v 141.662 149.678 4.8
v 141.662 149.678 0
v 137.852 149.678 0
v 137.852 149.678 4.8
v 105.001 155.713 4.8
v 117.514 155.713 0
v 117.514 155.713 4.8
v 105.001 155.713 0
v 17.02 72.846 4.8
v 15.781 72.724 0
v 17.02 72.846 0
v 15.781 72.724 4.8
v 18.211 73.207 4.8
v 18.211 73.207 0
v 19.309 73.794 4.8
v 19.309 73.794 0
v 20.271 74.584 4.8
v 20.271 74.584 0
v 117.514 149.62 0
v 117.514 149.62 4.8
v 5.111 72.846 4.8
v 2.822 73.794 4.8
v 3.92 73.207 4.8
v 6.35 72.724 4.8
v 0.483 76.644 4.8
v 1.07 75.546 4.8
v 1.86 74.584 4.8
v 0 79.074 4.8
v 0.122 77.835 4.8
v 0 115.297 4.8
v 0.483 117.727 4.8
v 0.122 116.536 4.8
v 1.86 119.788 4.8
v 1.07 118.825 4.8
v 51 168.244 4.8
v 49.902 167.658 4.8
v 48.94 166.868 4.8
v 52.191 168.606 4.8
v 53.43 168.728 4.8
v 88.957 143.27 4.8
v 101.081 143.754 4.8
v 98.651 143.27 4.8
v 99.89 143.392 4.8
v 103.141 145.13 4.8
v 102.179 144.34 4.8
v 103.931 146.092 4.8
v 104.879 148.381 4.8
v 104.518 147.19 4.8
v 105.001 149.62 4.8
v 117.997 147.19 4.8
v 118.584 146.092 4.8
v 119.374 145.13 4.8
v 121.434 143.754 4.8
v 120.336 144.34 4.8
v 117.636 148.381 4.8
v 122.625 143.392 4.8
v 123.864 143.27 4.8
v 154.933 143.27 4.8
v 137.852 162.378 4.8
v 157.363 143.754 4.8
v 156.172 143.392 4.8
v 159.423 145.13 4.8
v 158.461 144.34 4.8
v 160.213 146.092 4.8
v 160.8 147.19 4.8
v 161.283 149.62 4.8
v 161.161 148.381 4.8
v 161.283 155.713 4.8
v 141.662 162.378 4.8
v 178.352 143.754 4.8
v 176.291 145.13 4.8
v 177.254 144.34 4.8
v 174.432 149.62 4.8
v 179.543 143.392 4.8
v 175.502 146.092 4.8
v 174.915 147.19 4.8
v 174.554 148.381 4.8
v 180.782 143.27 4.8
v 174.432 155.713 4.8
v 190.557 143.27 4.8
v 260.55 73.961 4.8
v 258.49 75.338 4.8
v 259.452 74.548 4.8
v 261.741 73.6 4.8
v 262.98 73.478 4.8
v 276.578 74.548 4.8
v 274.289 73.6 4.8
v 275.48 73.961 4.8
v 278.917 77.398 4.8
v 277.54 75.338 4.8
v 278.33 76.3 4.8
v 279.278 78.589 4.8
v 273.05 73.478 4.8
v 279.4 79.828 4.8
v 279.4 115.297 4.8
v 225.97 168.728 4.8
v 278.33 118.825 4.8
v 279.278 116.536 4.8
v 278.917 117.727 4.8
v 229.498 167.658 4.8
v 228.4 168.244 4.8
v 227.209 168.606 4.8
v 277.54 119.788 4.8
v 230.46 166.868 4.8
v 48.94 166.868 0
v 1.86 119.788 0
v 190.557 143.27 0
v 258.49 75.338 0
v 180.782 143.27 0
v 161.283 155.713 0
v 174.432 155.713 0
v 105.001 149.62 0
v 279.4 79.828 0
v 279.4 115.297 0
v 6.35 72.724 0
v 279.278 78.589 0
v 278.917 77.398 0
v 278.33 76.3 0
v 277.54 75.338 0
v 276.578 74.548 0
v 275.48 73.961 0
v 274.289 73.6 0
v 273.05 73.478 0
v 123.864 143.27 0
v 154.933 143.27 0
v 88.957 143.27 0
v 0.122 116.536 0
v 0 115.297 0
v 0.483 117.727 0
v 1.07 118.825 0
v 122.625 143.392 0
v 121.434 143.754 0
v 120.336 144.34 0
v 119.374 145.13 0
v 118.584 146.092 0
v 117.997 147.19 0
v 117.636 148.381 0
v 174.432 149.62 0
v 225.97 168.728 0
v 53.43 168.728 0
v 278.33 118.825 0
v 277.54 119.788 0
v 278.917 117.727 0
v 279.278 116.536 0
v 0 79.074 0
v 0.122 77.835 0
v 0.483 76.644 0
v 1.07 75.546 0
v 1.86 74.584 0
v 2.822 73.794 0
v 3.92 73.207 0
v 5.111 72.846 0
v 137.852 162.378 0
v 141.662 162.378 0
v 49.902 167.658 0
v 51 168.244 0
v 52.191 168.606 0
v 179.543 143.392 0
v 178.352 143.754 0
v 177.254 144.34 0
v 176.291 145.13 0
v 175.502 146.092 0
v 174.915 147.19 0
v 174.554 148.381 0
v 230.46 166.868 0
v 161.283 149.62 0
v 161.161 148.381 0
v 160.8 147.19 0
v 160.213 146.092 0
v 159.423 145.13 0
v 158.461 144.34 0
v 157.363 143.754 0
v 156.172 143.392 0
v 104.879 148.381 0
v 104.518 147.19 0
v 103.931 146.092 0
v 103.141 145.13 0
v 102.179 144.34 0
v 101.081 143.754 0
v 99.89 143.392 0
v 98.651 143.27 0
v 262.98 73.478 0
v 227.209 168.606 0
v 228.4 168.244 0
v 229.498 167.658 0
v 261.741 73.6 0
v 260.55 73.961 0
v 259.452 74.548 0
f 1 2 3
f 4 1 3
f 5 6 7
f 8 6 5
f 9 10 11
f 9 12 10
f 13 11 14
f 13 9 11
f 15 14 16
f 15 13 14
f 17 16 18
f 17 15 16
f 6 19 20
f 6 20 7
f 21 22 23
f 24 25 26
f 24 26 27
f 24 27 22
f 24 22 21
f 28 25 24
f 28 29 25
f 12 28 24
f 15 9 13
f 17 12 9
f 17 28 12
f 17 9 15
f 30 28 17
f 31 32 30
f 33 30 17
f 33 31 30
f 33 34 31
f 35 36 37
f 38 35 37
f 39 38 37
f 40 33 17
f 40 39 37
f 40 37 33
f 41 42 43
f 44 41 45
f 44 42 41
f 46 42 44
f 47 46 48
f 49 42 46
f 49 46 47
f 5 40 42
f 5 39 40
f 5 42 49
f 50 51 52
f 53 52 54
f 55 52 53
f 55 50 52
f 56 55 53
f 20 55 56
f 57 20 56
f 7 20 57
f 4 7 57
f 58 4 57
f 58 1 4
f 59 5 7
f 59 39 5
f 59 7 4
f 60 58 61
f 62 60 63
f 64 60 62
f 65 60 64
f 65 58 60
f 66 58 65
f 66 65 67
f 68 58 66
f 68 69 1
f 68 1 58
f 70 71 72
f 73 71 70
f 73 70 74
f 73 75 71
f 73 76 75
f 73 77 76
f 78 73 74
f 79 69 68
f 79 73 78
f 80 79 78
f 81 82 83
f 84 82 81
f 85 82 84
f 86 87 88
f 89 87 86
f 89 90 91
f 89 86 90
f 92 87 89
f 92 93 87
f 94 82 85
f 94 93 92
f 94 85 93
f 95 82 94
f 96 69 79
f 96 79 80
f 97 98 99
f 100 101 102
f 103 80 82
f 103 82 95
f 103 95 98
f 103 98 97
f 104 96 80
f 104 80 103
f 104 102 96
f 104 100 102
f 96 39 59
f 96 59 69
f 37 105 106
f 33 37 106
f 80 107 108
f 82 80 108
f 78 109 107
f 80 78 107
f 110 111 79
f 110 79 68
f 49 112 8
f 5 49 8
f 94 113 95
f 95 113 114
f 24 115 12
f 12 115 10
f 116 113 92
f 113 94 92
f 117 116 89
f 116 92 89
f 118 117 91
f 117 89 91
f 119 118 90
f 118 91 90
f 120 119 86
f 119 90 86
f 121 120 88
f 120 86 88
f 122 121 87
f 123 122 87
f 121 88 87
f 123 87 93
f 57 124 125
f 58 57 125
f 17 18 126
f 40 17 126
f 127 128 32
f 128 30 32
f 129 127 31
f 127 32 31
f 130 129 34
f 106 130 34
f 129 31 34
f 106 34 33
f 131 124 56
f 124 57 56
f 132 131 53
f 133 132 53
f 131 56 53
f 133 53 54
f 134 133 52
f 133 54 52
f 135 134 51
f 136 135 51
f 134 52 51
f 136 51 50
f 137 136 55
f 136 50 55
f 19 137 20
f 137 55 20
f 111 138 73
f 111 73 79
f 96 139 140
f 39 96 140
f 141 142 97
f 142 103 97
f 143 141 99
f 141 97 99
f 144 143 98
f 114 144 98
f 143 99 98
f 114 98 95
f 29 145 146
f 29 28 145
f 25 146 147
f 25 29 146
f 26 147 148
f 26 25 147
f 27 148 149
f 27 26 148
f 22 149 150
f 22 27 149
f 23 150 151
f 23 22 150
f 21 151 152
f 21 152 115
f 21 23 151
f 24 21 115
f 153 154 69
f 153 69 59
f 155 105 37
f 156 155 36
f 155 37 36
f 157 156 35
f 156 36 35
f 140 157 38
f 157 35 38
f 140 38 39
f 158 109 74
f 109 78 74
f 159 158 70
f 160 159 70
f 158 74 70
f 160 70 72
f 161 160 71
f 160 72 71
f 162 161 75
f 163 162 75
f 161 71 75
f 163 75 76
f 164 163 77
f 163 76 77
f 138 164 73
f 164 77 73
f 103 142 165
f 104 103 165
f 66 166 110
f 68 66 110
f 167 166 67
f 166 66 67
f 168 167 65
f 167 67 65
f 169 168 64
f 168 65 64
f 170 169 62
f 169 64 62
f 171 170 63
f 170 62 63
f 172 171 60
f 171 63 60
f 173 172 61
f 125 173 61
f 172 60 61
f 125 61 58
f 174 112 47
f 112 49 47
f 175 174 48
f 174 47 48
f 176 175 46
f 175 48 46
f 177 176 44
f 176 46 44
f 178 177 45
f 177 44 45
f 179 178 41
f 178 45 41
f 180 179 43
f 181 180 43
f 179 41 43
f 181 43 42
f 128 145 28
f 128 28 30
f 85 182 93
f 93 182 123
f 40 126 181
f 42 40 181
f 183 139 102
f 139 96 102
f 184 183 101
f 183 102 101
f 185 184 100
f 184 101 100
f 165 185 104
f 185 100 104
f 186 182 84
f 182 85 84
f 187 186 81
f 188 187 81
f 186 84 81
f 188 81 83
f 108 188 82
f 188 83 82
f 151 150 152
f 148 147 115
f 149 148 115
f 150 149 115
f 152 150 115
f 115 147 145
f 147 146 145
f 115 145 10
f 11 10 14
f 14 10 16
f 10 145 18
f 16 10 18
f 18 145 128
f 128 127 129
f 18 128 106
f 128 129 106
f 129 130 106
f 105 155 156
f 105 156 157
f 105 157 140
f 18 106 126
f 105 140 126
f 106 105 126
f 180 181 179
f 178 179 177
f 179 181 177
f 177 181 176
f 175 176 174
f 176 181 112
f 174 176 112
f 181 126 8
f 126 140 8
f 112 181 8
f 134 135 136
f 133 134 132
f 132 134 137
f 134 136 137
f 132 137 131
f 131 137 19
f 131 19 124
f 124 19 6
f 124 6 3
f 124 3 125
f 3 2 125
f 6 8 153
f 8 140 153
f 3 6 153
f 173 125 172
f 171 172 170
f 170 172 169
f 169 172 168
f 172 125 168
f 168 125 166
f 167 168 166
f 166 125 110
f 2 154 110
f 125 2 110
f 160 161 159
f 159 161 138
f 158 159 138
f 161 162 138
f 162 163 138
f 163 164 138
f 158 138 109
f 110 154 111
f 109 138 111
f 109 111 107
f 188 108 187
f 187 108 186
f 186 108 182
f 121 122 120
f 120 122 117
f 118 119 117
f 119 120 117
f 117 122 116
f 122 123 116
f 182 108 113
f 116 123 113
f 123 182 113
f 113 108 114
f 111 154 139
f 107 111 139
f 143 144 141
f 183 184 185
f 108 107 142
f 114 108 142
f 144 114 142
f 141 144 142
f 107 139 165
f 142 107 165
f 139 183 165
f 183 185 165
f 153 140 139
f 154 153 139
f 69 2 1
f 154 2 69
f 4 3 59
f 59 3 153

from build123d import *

# Parameters (mm, degrees)
SKETCH1_W           = 279.4
SKETCH1_H           = 254
BOSS_EXTRUDE1_DEPTH = 4.800000052
SKETCH4_W           = 13.148347957
SKETCH4_H           = 12.442555781
SKETCH4_W_2         = 3.81
SKETCH4_H_2         = 12.7
SKETCH4_W_3         = 12.512633495
CUT_EXTRUDE1_DEPTH  = 378.628653575
FILLET1_R           = 6.35


with BuildPart() as part:
    # Sketch1 → Boss-Extrude1 (new body)
    with BuildSketch(Plane.XY):
        with Locations((139.7, 127)):
            Rectangle(SKETCH1_W, SKETCH1_H)
    extrude(amount=BOSS_EXTRUDE1_DEPTH)

    # Sketch4 → Cut-Extrude1 (cut, through all)
    with BuildSketch(Plane(origin=(0, 0, 0), x_dir=(-1, 0, 0), z_dir=(0, 0, -1))):
        Polygon((0, 0), (0, 72.724077305), (-18.411229684, 72.724077305), (-88.95741747, 143.27026509), (-105.001094941, 143.27026509), (-117.513728436, 143.27026509), (-161.28323771, 143.27026509), (-174.431585667, 143.27026509), (-190.55741747, 143.27026509), (-260.35, 73.47768256), (-279.4, 73.47768256), (-279.4, 0), align=None)
        Polygon((-190.5, 168.72768256), (-88.9, 168.72768256), (-50.8, 168.72768256), (0, 117.92768256), (0, 254), (-279.4, 254), (-279.4, 117.92768256), (-228.6, 168.72768256), align=None)
        with Locations((-167.857411689, 149.491542981)):
            Rectangle(SKETCH4_W, SKETCH4_H)
        with Locations((-139.75741747, 156.02768256)):
            Rectangle(SKETCH4_W_2, SKETCH4_H_2)
        with Locations((-111.257411689, 149.491542981)):
            Rectangle(SKETCH4_W_3, SKETCH4_H)
    extrude(amount=-CUT_EXTRUDE1_DEPTH, mode=Mode.SUBTRACT)

    # Fillet1
    fillet1_edges = [part.edges().sort_by_distance(p)[0] for p in [
        (18.411229684, 72.724077305, 2.400000026),
        (0, 72.724077305, 2.400000026),
        (279.4, 73.47768256, 2.400000026),
        (260.35, 73.47768256, 2.400000026),
        (174.431585667, 143.27026509, 2.400000026),
        (161.28323771, 143.27026509, 2.400000026),
        (117.513728436, 143.27026509, 2.400000026),
        (105.001094941, 143.27026509, 2.400000026),
        (228.6, 168.72768256, 2.400000026),
        (279.4, 117.92768256, 2.400000026),
        (0, 117.92768256, 2.400000026),
        (50.8, 168.72768256, 2.400000026),
    ]]
    fillet(fillet1_edges, radius=FILLET1_R)


solid = part.part
